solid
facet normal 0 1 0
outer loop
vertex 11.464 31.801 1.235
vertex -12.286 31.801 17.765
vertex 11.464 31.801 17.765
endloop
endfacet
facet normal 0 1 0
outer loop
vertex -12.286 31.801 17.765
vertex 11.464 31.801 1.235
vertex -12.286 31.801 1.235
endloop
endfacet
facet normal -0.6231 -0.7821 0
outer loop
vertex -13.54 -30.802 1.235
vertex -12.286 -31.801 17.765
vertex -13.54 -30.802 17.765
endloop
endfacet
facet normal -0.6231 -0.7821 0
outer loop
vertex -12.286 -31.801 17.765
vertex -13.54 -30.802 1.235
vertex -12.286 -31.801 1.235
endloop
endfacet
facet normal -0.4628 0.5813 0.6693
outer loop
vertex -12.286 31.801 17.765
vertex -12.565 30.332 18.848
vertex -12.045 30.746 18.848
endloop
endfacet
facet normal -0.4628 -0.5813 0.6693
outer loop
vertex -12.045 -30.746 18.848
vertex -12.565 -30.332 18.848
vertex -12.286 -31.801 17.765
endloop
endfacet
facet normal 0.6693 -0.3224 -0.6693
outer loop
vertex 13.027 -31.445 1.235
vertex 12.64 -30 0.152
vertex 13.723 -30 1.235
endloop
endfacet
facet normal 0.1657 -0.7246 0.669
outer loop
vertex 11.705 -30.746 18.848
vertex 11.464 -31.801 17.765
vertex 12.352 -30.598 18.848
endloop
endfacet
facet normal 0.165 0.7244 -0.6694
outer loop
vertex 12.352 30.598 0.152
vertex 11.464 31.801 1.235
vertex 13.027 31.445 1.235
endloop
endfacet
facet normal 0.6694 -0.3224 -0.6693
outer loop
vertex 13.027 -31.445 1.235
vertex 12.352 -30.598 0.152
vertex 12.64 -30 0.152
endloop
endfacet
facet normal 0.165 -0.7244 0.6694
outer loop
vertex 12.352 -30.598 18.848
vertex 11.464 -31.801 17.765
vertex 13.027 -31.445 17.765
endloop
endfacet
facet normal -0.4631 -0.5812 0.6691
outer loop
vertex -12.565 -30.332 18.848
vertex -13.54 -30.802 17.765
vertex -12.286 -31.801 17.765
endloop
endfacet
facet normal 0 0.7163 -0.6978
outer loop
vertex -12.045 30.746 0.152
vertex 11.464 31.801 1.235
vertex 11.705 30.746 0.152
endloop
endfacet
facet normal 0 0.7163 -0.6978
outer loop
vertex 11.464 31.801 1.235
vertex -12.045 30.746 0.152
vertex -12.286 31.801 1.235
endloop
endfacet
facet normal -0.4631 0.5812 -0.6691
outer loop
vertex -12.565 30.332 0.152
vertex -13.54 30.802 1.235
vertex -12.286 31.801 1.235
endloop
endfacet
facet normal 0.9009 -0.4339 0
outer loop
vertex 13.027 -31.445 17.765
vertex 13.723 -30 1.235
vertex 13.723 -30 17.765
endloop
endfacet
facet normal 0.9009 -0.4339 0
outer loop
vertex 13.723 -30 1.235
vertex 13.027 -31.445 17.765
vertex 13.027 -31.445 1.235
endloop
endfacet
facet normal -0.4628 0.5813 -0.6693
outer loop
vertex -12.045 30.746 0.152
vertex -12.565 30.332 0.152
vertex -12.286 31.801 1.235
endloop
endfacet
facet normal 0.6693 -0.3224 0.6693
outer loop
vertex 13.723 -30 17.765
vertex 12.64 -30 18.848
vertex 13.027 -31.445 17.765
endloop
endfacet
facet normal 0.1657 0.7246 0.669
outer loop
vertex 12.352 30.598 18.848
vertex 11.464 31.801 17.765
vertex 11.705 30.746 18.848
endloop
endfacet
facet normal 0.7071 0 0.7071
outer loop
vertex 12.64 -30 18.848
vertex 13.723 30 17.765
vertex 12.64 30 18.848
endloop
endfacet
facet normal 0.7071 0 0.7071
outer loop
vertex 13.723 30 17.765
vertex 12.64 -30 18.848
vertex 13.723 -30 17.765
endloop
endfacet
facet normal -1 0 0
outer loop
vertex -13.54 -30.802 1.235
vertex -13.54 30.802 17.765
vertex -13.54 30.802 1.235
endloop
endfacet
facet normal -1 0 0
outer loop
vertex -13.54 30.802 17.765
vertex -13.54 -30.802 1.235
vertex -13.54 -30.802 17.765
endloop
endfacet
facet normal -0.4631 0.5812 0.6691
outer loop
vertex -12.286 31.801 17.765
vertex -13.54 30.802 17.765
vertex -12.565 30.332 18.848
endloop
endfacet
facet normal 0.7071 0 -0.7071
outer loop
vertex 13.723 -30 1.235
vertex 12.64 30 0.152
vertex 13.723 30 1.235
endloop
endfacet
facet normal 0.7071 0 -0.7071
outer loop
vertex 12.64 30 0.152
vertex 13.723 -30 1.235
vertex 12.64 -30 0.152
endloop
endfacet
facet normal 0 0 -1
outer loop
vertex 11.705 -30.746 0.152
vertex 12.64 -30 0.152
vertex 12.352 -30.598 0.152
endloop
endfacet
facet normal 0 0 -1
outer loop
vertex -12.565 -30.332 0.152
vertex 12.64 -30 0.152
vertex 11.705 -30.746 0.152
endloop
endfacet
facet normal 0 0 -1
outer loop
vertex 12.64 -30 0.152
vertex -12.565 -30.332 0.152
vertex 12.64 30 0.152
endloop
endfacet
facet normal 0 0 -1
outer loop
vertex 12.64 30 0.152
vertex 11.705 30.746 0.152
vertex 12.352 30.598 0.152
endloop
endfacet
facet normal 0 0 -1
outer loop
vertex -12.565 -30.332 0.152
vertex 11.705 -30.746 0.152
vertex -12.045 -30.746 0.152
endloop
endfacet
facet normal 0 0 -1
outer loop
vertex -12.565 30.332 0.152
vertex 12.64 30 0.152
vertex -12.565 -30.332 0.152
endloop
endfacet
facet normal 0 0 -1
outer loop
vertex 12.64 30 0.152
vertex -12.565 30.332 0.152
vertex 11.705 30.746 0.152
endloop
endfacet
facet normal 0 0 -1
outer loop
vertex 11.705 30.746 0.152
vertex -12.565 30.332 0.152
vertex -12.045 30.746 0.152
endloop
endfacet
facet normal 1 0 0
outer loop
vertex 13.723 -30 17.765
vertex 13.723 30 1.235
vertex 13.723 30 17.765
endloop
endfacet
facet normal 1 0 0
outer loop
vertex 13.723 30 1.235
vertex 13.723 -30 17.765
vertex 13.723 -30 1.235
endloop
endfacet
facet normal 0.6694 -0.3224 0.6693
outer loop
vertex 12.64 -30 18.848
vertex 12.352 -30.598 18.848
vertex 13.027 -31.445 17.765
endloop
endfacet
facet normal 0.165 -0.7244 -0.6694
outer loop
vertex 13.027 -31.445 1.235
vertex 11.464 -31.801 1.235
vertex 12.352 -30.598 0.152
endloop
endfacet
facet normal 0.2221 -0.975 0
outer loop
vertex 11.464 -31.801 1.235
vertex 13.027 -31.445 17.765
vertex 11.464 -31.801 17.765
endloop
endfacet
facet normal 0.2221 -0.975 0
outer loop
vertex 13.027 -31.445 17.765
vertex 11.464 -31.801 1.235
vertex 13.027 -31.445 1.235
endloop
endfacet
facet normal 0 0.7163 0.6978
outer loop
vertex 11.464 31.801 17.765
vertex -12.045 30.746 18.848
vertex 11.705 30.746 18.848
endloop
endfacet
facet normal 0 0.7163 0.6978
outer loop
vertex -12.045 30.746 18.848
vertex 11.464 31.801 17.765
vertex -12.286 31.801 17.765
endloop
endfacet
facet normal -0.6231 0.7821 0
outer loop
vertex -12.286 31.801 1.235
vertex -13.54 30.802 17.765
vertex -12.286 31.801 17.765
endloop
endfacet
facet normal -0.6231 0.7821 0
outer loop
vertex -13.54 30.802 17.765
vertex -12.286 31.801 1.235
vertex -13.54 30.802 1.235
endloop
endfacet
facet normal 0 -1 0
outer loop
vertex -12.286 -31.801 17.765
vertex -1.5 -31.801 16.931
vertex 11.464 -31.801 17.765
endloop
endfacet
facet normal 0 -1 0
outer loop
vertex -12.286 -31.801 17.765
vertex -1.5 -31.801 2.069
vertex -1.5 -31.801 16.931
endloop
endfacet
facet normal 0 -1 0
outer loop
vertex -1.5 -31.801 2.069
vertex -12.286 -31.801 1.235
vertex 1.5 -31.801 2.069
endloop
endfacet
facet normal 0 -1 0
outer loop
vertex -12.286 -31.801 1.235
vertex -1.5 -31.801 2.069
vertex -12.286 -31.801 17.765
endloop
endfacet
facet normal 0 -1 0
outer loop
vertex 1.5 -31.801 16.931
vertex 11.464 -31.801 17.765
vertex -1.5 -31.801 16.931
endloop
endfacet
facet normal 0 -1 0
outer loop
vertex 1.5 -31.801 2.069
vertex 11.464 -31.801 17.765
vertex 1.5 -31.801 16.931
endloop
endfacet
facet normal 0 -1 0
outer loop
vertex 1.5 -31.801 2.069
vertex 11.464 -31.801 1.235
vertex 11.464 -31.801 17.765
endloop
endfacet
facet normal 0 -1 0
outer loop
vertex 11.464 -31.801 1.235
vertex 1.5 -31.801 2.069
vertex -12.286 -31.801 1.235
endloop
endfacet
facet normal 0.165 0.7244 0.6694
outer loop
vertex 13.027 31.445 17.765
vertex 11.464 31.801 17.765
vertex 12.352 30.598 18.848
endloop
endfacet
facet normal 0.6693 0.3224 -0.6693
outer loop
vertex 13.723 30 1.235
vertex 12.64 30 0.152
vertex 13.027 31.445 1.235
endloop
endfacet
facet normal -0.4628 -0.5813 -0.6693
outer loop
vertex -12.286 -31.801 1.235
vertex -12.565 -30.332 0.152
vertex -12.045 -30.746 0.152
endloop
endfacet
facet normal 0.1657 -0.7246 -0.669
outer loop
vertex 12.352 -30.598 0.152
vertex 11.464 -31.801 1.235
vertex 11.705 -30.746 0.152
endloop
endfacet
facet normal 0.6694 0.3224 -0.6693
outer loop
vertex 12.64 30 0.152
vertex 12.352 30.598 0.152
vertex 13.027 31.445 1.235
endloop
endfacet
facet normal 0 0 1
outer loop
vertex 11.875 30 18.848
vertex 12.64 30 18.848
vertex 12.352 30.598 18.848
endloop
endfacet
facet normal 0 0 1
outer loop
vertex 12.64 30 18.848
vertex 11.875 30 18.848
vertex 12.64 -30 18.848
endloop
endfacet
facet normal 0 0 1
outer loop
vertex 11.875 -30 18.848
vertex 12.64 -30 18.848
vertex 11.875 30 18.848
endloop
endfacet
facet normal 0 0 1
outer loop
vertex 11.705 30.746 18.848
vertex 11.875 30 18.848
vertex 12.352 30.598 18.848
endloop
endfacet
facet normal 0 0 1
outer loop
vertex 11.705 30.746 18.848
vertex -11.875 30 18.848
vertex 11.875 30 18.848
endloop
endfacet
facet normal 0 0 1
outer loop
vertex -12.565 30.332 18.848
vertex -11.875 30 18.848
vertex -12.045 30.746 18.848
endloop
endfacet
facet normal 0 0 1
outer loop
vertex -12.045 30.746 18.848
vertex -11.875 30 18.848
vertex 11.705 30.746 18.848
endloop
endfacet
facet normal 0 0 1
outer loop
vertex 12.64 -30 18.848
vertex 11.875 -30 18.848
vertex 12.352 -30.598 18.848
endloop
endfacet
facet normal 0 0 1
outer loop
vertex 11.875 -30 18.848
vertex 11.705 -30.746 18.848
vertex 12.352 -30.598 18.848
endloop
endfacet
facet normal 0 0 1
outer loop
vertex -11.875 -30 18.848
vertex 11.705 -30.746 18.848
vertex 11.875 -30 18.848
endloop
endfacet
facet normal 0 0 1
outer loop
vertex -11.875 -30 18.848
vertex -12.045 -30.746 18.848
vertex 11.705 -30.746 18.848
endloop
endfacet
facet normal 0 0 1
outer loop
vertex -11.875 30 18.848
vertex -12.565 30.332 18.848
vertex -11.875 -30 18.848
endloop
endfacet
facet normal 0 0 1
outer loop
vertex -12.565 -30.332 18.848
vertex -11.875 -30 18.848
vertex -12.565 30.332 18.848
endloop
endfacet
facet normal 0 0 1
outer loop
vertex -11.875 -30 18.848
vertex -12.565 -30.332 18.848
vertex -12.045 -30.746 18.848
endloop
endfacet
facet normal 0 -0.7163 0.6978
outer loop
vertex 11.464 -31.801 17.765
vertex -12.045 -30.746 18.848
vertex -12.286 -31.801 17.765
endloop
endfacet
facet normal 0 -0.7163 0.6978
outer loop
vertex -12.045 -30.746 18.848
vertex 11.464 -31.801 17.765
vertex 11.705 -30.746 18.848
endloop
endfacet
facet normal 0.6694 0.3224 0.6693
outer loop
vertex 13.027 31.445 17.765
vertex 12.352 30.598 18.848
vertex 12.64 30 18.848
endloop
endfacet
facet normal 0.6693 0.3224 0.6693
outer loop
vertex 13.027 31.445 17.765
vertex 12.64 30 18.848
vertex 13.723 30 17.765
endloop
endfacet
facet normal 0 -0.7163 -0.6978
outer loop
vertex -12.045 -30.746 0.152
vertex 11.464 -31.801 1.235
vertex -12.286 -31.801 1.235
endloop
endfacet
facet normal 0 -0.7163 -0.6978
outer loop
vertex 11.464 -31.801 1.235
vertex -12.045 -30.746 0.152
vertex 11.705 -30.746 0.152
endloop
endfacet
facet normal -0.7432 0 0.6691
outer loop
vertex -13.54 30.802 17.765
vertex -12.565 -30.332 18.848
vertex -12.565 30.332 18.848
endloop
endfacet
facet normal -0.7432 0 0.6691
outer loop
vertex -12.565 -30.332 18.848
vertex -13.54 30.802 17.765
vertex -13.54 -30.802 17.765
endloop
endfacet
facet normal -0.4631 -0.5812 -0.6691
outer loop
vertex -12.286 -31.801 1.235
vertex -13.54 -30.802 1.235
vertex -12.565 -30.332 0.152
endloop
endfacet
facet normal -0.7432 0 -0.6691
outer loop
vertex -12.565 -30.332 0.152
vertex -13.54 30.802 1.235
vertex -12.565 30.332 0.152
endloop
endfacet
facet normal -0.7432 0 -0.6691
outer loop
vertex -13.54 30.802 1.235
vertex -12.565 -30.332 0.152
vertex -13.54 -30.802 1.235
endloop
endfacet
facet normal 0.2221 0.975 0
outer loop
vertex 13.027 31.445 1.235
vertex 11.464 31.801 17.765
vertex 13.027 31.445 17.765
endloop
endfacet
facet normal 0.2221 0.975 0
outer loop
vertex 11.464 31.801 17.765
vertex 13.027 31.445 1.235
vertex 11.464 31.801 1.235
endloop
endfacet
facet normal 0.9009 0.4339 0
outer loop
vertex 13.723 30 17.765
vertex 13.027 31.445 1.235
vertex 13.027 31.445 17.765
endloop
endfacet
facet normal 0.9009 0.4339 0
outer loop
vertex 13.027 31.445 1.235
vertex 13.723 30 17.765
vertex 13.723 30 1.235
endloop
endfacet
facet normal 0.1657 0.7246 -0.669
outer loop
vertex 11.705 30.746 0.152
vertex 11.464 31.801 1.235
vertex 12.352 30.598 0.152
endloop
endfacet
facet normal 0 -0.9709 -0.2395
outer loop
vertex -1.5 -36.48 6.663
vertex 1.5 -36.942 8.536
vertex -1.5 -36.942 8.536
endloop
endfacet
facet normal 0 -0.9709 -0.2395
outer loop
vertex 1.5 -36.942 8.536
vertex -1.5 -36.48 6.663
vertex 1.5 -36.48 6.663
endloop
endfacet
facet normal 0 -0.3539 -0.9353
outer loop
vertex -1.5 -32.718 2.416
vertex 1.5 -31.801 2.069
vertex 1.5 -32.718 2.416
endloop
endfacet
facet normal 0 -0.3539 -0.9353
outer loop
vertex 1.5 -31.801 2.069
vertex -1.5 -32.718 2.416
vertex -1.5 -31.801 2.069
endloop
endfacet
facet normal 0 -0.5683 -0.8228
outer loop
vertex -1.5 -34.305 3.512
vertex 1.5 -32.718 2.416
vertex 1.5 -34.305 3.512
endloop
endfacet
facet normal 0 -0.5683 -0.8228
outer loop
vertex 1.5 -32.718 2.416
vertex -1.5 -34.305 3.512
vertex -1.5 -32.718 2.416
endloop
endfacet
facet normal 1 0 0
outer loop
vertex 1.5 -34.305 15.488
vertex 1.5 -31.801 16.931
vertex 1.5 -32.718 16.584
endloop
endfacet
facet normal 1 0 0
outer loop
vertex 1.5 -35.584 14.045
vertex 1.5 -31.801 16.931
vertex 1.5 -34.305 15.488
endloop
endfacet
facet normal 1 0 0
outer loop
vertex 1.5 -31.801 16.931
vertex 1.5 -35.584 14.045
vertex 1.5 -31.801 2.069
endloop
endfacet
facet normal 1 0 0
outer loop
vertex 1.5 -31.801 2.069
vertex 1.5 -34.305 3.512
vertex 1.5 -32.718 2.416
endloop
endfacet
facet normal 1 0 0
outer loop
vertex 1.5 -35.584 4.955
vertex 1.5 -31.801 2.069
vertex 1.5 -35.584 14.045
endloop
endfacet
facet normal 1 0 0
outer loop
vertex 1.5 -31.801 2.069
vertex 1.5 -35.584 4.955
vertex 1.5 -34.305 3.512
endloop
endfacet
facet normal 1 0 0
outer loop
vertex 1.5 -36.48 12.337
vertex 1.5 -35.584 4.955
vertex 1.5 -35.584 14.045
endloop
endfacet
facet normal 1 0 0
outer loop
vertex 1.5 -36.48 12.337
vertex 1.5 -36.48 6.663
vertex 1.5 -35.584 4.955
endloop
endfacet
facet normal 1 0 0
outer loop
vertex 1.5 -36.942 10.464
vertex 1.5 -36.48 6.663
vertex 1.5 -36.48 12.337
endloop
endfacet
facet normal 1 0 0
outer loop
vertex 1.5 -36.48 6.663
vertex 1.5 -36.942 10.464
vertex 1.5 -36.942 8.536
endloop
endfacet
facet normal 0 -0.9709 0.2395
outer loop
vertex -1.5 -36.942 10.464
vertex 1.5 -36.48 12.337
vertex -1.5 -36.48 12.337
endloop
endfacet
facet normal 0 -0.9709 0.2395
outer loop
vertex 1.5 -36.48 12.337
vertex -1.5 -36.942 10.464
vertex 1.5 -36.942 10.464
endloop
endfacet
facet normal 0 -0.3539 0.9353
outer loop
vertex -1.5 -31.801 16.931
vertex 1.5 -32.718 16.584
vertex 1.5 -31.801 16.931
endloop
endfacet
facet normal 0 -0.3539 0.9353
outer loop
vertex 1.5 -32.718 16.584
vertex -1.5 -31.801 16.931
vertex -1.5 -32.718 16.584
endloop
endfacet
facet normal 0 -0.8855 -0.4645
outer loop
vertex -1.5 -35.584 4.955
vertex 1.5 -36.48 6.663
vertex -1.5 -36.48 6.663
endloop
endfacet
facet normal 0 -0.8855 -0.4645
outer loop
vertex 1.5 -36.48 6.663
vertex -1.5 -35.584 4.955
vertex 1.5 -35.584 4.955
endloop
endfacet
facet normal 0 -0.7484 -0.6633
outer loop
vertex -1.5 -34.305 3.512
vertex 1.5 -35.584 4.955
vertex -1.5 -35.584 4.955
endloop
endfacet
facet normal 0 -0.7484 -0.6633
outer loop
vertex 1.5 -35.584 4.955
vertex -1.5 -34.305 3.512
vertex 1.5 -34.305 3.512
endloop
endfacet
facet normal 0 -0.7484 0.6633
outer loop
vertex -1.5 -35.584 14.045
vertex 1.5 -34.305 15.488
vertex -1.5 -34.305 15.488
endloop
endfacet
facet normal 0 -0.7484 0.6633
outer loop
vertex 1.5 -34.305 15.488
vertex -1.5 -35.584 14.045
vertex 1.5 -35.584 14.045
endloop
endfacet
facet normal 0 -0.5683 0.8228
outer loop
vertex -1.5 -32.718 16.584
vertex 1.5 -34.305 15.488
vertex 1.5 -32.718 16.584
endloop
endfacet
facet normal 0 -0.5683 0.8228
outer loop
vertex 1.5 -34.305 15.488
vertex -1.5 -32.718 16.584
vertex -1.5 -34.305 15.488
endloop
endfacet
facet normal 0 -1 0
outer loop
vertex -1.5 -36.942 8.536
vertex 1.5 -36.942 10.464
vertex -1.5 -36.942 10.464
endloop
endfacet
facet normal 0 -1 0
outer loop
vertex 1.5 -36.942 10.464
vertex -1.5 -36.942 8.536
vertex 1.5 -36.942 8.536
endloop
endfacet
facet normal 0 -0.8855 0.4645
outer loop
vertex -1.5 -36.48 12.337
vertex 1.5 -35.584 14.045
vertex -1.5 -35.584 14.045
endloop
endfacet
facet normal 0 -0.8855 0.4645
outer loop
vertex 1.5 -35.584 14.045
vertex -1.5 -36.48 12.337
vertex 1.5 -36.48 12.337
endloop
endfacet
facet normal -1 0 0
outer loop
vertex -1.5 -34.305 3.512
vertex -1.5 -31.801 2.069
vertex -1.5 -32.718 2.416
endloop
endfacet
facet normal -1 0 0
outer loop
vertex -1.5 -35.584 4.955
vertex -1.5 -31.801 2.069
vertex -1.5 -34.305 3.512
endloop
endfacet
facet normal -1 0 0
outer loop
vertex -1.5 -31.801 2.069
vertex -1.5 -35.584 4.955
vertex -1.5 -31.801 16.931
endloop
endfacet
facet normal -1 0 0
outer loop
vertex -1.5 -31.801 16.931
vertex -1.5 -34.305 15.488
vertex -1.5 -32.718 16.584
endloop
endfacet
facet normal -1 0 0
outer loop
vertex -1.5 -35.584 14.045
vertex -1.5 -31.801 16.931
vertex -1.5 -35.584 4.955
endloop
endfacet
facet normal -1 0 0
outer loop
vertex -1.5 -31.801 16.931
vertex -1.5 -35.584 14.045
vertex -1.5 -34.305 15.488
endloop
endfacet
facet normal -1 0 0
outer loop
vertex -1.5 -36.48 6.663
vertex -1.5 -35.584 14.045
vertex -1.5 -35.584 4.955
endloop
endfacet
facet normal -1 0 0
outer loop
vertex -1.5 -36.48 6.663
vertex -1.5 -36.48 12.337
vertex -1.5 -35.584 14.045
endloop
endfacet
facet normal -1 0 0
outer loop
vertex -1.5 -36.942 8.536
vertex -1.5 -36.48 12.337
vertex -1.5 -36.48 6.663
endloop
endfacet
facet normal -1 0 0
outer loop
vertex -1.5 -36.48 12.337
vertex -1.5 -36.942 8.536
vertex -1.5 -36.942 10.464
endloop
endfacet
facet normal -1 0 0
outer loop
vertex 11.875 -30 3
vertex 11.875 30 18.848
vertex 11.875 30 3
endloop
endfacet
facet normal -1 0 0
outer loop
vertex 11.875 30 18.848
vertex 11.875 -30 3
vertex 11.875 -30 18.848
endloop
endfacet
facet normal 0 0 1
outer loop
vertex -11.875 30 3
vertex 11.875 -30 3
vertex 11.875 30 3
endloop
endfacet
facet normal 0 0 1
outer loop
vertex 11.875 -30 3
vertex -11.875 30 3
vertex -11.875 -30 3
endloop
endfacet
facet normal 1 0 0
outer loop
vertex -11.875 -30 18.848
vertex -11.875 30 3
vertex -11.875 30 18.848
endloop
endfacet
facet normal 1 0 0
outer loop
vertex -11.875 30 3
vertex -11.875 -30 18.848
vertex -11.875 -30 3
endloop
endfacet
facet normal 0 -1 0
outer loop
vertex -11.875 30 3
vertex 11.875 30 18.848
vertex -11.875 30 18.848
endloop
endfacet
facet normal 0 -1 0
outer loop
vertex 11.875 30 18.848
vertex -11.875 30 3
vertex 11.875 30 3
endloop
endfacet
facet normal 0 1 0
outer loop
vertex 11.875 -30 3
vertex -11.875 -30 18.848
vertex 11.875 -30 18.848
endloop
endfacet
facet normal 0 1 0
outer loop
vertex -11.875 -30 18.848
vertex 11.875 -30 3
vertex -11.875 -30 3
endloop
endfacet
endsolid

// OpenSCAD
//$fa=5; $fs=0.1;

// параметры рамы ящиков
step=17.5;
boxW=step*8-10;
cellH=20;
cellW=(boxW-15)/4;
offsY=-step*2+5;
depth=step*4-5;

// параметры ящиков
W=cellW-1; 
H=cellH-1;
L=depth-1;
wall=2;

R=2; // радиус сферы скругления

module box(){

difference(){
	union(){
		hull(){ //внешнее
			translate([-W/2+R, -L/2+R, R]) sphere(r=R, center=true);
			translate([W/2-R, -L/2+R, R]) sphere(r=R, center=true);
			translate([-W/2+R, L/2-R, R]) sphere(r=R, center=true);
			translate([W/2-R, L/2-R, R]) sphere(r=R, center=true);

			translate([-W/2+R, -L/2+R, H-R]) sphere(r=R, center=true);
			translate([W/2-R, -L/2+R, H-R]) sphere(r=R, center=true);
			translate([-W/2+R, L/2-R, H-R]) sphere(r=R, center=true);
			translate([W/2-R, L/2-R, H-R]) sphere(r=R, center=true);
		} 

		translate([0, -L/2+3, H/2]) rotate([0, 90, 0]) cylinder(h=3, r=8, center=true); // ручка
	}

	union(){
		translate([0,0,H/2+wall]) cube([W-2*wall, L-2*wall, H-wall], center=true);
	}
}

}

box();
